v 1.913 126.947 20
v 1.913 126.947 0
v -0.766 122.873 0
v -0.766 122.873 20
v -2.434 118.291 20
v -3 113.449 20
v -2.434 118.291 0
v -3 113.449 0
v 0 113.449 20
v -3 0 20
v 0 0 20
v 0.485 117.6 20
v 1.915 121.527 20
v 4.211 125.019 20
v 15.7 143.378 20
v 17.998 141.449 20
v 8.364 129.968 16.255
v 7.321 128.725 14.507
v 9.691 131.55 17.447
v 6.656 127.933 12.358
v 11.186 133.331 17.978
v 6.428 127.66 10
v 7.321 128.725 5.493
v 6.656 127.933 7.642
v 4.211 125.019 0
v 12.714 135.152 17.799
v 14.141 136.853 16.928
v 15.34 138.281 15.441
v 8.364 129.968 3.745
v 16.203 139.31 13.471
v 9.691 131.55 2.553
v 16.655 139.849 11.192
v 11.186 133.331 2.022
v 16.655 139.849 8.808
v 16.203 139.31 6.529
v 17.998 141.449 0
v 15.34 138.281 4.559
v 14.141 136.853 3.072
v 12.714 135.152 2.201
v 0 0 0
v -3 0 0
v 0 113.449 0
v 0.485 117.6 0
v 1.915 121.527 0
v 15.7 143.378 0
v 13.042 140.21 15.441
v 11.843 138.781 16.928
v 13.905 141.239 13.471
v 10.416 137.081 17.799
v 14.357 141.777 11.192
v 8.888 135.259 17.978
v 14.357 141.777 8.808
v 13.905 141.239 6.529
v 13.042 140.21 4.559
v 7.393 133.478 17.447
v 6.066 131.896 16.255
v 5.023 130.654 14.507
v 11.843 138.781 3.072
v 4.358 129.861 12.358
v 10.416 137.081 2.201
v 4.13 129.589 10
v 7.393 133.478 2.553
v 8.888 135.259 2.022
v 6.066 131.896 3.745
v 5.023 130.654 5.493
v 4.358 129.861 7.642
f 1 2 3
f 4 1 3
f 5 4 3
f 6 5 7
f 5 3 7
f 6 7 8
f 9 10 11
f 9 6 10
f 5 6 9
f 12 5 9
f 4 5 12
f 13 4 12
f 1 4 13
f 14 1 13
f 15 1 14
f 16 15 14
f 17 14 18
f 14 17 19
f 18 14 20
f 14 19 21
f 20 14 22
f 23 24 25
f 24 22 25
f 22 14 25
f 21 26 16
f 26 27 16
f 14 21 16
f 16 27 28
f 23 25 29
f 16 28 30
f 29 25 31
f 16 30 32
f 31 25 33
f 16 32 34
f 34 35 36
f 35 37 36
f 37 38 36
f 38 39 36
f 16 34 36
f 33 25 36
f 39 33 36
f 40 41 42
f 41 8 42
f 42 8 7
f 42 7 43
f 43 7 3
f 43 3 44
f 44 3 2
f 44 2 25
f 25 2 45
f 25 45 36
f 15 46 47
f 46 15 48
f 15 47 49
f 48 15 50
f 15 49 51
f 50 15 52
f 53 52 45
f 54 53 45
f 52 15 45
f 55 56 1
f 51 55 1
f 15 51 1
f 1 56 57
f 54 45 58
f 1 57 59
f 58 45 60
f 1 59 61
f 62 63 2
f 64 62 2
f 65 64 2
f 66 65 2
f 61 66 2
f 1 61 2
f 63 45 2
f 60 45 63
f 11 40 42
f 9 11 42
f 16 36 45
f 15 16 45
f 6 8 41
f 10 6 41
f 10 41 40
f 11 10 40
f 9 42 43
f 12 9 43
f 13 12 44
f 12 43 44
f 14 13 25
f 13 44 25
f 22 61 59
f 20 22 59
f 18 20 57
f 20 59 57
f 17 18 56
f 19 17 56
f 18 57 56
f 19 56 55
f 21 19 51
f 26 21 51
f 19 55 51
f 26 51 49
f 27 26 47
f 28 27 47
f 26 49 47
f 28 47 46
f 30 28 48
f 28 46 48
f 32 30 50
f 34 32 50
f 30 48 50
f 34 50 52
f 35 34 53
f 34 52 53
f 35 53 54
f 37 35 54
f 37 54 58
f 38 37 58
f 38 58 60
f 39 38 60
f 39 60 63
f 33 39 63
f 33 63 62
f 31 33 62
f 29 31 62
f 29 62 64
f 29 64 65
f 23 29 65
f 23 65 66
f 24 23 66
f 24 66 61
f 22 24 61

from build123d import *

# Parameters (mm, degrees)
F1_DEPTH = 20
F2_R     = 8
F3_DEPTH = 4


with BuildPart() as f1:
    # F0 (on Top) → F1 (new body)
    with BuildSketch(Plane.XY):
        with BuildLine():
            Line((-3, 0), (0, 0))
            Line((0, 0), (0, 113.4485357832))
            ThreePointArc((0, 113.4485357832), (1.0855328259, 119.6048983631), (4.2112000239, 125.0187127576))
            Line((4.2112000239, 125.0187127576), (17.9980530712, 141.4492444073))
            Line((17.9980530712, 141.4492444073), (15.6999197419, 143.3776072364))
            Line((15.6999197419, 143.3776072364), (1.9130666945, 126.9470755866))
            ThreePointArc((1.9130666945, 126.9470755866), (-1.7335450365, 120.630958793), (-3, 113.4485357832))
            Line((-3, 113.4485357832), (-3, 0))
        make_face()
    extrude(amount=F1_DEPTH)

    # F2 (on face) → F3 (cut)
    with BuildSketch(Plane(origin=(-61.3865985101, 51.509472169, 0), x_dir=(-0.6427876097, -0.7660444431, 0), z_dir=(-0.7660444431, 0.6427876097, 0))):
        with Locations((-109.9253331743, 10)):
            Circle(F2_R)
    extrude(amount=-F3_DEPTH, mode=Mode.SUBTRACT)


solid = f1.part
